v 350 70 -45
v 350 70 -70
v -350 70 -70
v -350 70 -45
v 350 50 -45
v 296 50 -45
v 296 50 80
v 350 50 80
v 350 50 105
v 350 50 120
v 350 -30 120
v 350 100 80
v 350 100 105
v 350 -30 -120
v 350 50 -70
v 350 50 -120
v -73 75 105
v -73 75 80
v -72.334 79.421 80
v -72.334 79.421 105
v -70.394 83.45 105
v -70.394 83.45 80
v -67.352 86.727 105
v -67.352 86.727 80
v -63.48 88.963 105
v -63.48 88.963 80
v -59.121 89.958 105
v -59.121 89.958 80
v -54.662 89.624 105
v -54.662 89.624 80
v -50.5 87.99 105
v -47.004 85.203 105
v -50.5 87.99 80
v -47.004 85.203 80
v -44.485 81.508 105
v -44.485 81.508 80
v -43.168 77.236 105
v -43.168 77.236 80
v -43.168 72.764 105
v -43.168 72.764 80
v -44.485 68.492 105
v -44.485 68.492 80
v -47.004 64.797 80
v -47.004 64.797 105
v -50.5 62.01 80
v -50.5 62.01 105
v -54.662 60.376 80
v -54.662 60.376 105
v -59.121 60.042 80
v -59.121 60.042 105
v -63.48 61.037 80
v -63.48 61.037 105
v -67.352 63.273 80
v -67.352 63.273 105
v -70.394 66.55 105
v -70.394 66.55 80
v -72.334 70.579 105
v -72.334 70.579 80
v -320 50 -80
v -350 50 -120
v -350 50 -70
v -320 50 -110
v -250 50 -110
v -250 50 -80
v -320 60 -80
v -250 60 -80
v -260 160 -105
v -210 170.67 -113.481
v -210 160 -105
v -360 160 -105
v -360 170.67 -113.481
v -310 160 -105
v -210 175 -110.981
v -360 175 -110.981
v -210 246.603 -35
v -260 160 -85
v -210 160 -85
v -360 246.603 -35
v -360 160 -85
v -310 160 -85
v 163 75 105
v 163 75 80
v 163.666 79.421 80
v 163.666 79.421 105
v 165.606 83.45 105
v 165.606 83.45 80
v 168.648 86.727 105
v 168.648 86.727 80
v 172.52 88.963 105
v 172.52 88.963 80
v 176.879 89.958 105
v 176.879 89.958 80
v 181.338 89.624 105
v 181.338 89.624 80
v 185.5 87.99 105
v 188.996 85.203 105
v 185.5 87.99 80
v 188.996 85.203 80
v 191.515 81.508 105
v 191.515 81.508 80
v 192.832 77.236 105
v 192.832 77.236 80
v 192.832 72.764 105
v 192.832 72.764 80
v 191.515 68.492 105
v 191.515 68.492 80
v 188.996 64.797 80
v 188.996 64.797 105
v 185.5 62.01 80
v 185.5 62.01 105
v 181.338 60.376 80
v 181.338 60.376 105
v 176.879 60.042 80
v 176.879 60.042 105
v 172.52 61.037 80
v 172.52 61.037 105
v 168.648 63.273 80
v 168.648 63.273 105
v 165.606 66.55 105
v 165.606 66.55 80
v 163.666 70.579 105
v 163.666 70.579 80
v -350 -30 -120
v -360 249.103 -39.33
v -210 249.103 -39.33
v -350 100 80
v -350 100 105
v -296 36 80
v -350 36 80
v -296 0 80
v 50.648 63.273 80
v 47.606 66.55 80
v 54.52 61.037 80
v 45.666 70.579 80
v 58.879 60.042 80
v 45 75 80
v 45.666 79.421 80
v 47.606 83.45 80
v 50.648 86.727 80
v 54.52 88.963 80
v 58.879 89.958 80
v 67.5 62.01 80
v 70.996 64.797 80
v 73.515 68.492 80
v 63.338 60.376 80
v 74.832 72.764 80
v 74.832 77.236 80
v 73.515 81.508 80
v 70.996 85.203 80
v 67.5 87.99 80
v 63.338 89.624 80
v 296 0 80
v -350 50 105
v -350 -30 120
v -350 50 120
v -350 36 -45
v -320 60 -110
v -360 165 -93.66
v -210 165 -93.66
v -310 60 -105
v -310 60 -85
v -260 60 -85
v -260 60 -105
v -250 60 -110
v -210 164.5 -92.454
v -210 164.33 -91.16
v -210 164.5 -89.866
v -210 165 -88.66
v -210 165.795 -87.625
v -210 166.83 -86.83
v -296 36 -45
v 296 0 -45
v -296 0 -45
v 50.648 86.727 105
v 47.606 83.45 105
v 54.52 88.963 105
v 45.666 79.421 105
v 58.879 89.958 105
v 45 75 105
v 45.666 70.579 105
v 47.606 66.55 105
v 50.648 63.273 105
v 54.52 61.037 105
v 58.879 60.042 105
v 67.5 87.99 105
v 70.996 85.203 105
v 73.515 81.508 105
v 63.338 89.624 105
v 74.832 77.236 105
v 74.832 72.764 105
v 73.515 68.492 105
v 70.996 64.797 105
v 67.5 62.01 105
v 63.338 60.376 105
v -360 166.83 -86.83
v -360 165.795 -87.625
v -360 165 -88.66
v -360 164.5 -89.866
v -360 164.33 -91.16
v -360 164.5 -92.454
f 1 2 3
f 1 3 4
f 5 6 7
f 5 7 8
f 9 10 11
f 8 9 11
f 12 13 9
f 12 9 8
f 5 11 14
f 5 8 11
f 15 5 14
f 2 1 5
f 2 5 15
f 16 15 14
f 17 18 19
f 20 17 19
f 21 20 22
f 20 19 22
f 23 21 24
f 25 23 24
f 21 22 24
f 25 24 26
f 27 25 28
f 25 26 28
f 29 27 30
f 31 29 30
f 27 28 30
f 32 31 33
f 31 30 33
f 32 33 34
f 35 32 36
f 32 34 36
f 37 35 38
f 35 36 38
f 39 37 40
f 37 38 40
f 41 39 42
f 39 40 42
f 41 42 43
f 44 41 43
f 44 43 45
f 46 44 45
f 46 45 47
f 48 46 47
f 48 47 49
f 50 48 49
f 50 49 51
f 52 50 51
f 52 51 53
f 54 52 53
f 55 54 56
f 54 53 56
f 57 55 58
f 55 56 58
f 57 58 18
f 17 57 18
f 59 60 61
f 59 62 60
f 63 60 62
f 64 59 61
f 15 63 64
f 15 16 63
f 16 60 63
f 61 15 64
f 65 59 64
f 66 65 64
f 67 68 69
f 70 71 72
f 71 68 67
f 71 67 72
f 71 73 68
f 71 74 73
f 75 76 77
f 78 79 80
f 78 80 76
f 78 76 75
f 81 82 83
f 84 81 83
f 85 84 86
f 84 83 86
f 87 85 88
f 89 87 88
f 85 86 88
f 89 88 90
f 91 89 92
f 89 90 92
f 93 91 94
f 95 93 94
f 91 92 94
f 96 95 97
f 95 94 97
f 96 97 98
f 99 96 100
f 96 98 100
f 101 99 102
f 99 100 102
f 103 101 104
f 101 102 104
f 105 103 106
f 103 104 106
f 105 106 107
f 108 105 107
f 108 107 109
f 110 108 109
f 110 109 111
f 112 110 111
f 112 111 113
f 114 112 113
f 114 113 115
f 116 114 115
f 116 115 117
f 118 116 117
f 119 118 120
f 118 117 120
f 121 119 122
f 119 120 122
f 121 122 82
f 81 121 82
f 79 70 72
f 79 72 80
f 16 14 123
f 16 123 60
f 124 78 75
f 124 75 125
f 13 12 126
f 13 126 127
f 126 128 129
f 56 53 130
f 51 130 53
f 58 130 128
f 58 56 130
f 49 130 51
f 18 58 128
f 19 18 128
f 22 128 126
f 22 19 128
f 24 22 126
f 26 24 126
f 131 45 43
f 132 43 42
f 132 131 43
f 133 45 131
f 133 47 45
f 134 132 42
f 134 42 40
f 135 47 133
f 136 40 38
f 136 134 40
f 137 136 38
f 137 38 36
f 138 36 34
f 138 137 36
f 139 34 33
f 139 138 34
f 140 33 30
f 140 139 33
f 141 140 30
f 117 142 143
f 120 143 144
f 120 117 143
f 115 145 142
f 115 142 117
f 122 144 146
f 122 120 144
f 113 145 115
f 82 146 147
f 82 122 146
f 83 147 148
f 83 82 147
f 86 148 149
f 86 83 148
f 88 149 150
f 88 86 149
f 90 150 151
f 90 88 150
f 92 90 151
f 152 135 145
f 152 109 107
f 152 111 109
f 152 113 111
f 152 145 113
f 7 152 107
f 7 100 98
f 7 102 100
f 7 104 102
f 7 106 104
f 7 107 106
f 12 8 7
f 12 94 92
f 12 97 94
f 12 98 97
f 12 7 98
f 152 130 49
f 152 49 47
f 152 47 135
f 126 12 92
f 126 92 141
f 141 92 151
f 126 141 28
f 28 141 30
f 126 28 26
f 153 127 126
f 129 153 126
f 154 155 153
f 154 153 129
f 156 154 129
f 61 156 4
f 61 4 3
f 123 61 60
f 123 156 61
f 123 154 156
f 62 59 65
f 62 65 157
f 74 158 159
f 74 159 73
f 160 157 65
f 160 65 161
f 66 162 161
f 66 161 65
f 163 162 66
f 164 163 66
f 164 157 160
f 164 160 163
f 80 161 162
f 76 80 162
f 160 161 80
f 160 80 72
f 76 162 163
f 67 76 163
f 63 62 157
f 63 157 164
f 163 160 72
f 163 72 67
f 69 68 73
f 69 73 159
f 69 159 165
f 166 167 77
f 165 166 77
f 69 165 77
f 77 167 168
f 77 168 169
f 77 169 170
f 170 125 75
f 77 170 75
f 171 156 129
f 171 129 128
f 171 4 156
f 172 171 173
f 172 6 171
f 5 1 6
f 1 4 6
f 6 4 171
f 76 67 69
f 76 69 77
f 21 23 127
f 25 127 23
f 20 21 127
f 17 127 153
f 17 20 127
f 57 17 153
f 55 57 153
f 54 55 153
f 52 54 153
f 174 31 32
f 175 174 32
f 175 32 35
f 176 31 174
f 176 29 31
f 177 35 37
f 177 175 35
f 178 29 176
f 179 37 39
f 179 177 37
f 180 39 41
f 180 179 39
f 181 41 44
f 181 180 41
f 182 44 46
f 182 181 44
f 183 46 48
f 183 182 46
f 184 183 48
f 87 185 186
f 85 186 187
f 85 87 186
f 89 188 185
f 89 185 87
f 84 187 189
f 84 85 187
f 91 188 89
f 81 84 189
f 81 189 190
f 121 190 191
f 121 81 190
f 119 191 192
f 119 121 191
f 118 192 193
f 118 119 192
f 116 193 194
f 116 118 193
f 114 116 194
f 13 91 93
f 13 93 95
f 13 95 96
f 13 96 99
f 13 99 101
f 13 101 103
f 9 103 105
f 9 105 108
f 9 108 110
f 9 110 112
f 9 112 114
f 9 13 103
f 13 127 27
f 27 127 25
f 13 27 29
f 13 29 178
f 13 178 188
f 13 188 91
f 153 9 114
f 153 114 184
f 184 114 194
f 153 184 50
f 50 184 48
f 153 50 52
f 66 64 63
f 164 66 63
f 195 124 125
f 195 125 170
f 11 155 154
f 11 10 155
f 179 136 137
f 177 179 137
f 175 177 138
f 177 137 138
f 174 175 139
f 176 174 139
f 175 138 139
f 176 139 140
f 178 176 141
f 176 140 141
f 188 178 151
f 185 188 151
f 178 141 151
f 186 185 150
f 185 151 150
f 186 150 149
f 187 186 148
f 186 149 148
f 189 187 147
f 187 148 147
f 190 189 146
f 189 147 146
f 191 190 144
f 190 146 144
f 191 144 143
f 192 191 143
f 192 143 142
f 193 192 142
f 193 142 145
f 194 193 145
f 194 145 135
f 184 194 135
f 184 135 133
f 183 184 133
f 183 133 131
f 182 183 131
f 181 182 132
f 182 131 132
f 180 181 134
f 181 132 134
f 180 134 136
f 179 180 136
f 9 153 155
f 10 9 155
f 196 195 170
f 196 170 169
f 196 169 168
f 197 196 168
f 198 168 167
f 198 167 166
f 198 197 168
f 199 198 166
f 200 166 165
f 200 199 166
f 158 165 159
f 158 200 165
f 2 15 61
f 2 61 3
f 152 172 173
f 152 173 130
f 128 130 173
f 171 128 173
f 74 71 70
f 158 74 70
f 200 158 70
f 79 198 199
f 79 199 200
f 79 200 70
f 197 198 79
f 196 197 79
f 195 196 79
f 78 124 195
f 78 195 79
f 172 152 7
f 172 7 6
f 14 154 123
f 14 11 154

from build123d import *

# Parameters (mm, degrees)
BOSS_EXTRUDE1_DEPTH = 350
SKETCH2_W           = 54
SKETCH2_H           = 125
BOSS_EXTRUDE2_DEPTH = 36
SKETCH4_W           = 54
SKETCH4_H           = 125
BOSS_EXTRUDE3_DEPTH = 50
SKETCH5_R           = 15
CUT_EXTRUDE1_DEPTH  = 25
SKETCH6_W           = 70
SKETCH6_H           = 30
BOSS_EXTRUDE4_DEPTH = 10
SKETCH7_W           = 50
SKETCH7_H           = 20
BOSS_EXTRUDE5_DEPTH = 100
BOSS_EXTRUDE6_DEPTH = 75


with BuildPart() as part:
    # Sketch1 → Boss-Extrude1 (new body, symmetric)
    with BuildSketch(Plane(origin=(0, 0, 0), x_dir=(0, 0, -1), z_dir=(1, 0, 0))):
        Polygon((-120, -30), (120, -30), (120, 50), (70, 50), (70, 70), (45, 70), (45, 0), (-80, 0), (-80, 100), (-105, 100), (-105, 50), (-120, 50), align=None)
    extrude(amount=BOSS_EXTRUDE1_DEPTH, both=True)

    # Sketch2 → Boss-Extrude2 (add)
    with BuildSketch(Plane(origin=(0, 0, 0), x_dir=(1, 0, 0), z_dir=(0, 1, 0))):
        with Locations((-323, -17.5)):
            Rectangle(SKETCH2_W, SKETCH2_H)
    extrude(amount=BOSS_EXTRUDE2_DEPTH)

    # Sketch4 → Boss-Extrude3 (add)
    with BuildSketch(Plane(origin=(0, 0, 0), x_dir=(1, 0, 0), z_dir=(0, 1, 0))):
        with Locations((323, -17.5)):
            Rectangle(SKETCH4_W, SKETCH4_H)
    extrude(amount=BOSS_EXTRUDE3_DEPTH)

    # Sketch5 → Cut-Extrude1 (cut)
    with BuildSketch(Plane(origin=(0, 0, 80), x_dir=(-1, 0, 0), z_dir=(0, 0, -1))):
        with Locations((-178, 75)):
            Circle(SKETCH5_R)
        with Locations((-60, 75)):
            Circle(SKETCH5_R)
        with Locations((58, 75)):
            Circle(SKETCH5_R)
    extrude(amount=-CUT_EXTRUDE1_DEPTH, mode=Mode.SUBTRACT)

    # Sketch6 → Boss-Extrude4 (add)
    with BuildSketch(Plane(origin=(0, 50, 0), x_dir=(1, 0, 0), z_dir=(0, 1, 0))):
        with Locations((-285, 95)):
            Rectangle(SKETCH6_W, SKETCH6_H)
    extrude(amount=BOSS_EXTRUDE4_DEPTH)

    # Sketch7 → Boss-Extrude5 (add)
    with BuildSketch(Plane(origin=(0, 60, 0), x_dir=(1, 0, 0), z_dir=(0, 1, 0))):
        with Locations((-285, 95)):
            Rectangle(SKETCH7_W, SKETCH7_H)
    extrude(amount=BOSS_EXTRUDE5_DEPTH)

    # Sketch10 → Boss-Extrude6 (add, symmetric)
    with BuildSketch(Plane.ZY.offset(285)):
        with BuildLine():
            Line((-105, 160), (-85, 160))
            Line((-85, 160), (-35, 246.602540378))
            Line((-35, 246.602540378), (-39.330127019, 249.102540378))
            Line((-39.330127019, 249.102540378), (-86.830127019, 166.830127019))
            ThreePointArc((-86.830127019, 166.830127019), (-89.866158812, 164.500497887), (-93.660254038, 165))
            Line((-93.660254038, 165), (-110.980762114, 175))
            Line((-110.980762114, 175), (-113.480762114, 170.669872981))
            Line((-113.480762114, 170.669872981), (-105, 160))
        make_face()
    extrude(amount=BOSS_EXTRUDE6_DEPTH, both=True)


solid = part.part
